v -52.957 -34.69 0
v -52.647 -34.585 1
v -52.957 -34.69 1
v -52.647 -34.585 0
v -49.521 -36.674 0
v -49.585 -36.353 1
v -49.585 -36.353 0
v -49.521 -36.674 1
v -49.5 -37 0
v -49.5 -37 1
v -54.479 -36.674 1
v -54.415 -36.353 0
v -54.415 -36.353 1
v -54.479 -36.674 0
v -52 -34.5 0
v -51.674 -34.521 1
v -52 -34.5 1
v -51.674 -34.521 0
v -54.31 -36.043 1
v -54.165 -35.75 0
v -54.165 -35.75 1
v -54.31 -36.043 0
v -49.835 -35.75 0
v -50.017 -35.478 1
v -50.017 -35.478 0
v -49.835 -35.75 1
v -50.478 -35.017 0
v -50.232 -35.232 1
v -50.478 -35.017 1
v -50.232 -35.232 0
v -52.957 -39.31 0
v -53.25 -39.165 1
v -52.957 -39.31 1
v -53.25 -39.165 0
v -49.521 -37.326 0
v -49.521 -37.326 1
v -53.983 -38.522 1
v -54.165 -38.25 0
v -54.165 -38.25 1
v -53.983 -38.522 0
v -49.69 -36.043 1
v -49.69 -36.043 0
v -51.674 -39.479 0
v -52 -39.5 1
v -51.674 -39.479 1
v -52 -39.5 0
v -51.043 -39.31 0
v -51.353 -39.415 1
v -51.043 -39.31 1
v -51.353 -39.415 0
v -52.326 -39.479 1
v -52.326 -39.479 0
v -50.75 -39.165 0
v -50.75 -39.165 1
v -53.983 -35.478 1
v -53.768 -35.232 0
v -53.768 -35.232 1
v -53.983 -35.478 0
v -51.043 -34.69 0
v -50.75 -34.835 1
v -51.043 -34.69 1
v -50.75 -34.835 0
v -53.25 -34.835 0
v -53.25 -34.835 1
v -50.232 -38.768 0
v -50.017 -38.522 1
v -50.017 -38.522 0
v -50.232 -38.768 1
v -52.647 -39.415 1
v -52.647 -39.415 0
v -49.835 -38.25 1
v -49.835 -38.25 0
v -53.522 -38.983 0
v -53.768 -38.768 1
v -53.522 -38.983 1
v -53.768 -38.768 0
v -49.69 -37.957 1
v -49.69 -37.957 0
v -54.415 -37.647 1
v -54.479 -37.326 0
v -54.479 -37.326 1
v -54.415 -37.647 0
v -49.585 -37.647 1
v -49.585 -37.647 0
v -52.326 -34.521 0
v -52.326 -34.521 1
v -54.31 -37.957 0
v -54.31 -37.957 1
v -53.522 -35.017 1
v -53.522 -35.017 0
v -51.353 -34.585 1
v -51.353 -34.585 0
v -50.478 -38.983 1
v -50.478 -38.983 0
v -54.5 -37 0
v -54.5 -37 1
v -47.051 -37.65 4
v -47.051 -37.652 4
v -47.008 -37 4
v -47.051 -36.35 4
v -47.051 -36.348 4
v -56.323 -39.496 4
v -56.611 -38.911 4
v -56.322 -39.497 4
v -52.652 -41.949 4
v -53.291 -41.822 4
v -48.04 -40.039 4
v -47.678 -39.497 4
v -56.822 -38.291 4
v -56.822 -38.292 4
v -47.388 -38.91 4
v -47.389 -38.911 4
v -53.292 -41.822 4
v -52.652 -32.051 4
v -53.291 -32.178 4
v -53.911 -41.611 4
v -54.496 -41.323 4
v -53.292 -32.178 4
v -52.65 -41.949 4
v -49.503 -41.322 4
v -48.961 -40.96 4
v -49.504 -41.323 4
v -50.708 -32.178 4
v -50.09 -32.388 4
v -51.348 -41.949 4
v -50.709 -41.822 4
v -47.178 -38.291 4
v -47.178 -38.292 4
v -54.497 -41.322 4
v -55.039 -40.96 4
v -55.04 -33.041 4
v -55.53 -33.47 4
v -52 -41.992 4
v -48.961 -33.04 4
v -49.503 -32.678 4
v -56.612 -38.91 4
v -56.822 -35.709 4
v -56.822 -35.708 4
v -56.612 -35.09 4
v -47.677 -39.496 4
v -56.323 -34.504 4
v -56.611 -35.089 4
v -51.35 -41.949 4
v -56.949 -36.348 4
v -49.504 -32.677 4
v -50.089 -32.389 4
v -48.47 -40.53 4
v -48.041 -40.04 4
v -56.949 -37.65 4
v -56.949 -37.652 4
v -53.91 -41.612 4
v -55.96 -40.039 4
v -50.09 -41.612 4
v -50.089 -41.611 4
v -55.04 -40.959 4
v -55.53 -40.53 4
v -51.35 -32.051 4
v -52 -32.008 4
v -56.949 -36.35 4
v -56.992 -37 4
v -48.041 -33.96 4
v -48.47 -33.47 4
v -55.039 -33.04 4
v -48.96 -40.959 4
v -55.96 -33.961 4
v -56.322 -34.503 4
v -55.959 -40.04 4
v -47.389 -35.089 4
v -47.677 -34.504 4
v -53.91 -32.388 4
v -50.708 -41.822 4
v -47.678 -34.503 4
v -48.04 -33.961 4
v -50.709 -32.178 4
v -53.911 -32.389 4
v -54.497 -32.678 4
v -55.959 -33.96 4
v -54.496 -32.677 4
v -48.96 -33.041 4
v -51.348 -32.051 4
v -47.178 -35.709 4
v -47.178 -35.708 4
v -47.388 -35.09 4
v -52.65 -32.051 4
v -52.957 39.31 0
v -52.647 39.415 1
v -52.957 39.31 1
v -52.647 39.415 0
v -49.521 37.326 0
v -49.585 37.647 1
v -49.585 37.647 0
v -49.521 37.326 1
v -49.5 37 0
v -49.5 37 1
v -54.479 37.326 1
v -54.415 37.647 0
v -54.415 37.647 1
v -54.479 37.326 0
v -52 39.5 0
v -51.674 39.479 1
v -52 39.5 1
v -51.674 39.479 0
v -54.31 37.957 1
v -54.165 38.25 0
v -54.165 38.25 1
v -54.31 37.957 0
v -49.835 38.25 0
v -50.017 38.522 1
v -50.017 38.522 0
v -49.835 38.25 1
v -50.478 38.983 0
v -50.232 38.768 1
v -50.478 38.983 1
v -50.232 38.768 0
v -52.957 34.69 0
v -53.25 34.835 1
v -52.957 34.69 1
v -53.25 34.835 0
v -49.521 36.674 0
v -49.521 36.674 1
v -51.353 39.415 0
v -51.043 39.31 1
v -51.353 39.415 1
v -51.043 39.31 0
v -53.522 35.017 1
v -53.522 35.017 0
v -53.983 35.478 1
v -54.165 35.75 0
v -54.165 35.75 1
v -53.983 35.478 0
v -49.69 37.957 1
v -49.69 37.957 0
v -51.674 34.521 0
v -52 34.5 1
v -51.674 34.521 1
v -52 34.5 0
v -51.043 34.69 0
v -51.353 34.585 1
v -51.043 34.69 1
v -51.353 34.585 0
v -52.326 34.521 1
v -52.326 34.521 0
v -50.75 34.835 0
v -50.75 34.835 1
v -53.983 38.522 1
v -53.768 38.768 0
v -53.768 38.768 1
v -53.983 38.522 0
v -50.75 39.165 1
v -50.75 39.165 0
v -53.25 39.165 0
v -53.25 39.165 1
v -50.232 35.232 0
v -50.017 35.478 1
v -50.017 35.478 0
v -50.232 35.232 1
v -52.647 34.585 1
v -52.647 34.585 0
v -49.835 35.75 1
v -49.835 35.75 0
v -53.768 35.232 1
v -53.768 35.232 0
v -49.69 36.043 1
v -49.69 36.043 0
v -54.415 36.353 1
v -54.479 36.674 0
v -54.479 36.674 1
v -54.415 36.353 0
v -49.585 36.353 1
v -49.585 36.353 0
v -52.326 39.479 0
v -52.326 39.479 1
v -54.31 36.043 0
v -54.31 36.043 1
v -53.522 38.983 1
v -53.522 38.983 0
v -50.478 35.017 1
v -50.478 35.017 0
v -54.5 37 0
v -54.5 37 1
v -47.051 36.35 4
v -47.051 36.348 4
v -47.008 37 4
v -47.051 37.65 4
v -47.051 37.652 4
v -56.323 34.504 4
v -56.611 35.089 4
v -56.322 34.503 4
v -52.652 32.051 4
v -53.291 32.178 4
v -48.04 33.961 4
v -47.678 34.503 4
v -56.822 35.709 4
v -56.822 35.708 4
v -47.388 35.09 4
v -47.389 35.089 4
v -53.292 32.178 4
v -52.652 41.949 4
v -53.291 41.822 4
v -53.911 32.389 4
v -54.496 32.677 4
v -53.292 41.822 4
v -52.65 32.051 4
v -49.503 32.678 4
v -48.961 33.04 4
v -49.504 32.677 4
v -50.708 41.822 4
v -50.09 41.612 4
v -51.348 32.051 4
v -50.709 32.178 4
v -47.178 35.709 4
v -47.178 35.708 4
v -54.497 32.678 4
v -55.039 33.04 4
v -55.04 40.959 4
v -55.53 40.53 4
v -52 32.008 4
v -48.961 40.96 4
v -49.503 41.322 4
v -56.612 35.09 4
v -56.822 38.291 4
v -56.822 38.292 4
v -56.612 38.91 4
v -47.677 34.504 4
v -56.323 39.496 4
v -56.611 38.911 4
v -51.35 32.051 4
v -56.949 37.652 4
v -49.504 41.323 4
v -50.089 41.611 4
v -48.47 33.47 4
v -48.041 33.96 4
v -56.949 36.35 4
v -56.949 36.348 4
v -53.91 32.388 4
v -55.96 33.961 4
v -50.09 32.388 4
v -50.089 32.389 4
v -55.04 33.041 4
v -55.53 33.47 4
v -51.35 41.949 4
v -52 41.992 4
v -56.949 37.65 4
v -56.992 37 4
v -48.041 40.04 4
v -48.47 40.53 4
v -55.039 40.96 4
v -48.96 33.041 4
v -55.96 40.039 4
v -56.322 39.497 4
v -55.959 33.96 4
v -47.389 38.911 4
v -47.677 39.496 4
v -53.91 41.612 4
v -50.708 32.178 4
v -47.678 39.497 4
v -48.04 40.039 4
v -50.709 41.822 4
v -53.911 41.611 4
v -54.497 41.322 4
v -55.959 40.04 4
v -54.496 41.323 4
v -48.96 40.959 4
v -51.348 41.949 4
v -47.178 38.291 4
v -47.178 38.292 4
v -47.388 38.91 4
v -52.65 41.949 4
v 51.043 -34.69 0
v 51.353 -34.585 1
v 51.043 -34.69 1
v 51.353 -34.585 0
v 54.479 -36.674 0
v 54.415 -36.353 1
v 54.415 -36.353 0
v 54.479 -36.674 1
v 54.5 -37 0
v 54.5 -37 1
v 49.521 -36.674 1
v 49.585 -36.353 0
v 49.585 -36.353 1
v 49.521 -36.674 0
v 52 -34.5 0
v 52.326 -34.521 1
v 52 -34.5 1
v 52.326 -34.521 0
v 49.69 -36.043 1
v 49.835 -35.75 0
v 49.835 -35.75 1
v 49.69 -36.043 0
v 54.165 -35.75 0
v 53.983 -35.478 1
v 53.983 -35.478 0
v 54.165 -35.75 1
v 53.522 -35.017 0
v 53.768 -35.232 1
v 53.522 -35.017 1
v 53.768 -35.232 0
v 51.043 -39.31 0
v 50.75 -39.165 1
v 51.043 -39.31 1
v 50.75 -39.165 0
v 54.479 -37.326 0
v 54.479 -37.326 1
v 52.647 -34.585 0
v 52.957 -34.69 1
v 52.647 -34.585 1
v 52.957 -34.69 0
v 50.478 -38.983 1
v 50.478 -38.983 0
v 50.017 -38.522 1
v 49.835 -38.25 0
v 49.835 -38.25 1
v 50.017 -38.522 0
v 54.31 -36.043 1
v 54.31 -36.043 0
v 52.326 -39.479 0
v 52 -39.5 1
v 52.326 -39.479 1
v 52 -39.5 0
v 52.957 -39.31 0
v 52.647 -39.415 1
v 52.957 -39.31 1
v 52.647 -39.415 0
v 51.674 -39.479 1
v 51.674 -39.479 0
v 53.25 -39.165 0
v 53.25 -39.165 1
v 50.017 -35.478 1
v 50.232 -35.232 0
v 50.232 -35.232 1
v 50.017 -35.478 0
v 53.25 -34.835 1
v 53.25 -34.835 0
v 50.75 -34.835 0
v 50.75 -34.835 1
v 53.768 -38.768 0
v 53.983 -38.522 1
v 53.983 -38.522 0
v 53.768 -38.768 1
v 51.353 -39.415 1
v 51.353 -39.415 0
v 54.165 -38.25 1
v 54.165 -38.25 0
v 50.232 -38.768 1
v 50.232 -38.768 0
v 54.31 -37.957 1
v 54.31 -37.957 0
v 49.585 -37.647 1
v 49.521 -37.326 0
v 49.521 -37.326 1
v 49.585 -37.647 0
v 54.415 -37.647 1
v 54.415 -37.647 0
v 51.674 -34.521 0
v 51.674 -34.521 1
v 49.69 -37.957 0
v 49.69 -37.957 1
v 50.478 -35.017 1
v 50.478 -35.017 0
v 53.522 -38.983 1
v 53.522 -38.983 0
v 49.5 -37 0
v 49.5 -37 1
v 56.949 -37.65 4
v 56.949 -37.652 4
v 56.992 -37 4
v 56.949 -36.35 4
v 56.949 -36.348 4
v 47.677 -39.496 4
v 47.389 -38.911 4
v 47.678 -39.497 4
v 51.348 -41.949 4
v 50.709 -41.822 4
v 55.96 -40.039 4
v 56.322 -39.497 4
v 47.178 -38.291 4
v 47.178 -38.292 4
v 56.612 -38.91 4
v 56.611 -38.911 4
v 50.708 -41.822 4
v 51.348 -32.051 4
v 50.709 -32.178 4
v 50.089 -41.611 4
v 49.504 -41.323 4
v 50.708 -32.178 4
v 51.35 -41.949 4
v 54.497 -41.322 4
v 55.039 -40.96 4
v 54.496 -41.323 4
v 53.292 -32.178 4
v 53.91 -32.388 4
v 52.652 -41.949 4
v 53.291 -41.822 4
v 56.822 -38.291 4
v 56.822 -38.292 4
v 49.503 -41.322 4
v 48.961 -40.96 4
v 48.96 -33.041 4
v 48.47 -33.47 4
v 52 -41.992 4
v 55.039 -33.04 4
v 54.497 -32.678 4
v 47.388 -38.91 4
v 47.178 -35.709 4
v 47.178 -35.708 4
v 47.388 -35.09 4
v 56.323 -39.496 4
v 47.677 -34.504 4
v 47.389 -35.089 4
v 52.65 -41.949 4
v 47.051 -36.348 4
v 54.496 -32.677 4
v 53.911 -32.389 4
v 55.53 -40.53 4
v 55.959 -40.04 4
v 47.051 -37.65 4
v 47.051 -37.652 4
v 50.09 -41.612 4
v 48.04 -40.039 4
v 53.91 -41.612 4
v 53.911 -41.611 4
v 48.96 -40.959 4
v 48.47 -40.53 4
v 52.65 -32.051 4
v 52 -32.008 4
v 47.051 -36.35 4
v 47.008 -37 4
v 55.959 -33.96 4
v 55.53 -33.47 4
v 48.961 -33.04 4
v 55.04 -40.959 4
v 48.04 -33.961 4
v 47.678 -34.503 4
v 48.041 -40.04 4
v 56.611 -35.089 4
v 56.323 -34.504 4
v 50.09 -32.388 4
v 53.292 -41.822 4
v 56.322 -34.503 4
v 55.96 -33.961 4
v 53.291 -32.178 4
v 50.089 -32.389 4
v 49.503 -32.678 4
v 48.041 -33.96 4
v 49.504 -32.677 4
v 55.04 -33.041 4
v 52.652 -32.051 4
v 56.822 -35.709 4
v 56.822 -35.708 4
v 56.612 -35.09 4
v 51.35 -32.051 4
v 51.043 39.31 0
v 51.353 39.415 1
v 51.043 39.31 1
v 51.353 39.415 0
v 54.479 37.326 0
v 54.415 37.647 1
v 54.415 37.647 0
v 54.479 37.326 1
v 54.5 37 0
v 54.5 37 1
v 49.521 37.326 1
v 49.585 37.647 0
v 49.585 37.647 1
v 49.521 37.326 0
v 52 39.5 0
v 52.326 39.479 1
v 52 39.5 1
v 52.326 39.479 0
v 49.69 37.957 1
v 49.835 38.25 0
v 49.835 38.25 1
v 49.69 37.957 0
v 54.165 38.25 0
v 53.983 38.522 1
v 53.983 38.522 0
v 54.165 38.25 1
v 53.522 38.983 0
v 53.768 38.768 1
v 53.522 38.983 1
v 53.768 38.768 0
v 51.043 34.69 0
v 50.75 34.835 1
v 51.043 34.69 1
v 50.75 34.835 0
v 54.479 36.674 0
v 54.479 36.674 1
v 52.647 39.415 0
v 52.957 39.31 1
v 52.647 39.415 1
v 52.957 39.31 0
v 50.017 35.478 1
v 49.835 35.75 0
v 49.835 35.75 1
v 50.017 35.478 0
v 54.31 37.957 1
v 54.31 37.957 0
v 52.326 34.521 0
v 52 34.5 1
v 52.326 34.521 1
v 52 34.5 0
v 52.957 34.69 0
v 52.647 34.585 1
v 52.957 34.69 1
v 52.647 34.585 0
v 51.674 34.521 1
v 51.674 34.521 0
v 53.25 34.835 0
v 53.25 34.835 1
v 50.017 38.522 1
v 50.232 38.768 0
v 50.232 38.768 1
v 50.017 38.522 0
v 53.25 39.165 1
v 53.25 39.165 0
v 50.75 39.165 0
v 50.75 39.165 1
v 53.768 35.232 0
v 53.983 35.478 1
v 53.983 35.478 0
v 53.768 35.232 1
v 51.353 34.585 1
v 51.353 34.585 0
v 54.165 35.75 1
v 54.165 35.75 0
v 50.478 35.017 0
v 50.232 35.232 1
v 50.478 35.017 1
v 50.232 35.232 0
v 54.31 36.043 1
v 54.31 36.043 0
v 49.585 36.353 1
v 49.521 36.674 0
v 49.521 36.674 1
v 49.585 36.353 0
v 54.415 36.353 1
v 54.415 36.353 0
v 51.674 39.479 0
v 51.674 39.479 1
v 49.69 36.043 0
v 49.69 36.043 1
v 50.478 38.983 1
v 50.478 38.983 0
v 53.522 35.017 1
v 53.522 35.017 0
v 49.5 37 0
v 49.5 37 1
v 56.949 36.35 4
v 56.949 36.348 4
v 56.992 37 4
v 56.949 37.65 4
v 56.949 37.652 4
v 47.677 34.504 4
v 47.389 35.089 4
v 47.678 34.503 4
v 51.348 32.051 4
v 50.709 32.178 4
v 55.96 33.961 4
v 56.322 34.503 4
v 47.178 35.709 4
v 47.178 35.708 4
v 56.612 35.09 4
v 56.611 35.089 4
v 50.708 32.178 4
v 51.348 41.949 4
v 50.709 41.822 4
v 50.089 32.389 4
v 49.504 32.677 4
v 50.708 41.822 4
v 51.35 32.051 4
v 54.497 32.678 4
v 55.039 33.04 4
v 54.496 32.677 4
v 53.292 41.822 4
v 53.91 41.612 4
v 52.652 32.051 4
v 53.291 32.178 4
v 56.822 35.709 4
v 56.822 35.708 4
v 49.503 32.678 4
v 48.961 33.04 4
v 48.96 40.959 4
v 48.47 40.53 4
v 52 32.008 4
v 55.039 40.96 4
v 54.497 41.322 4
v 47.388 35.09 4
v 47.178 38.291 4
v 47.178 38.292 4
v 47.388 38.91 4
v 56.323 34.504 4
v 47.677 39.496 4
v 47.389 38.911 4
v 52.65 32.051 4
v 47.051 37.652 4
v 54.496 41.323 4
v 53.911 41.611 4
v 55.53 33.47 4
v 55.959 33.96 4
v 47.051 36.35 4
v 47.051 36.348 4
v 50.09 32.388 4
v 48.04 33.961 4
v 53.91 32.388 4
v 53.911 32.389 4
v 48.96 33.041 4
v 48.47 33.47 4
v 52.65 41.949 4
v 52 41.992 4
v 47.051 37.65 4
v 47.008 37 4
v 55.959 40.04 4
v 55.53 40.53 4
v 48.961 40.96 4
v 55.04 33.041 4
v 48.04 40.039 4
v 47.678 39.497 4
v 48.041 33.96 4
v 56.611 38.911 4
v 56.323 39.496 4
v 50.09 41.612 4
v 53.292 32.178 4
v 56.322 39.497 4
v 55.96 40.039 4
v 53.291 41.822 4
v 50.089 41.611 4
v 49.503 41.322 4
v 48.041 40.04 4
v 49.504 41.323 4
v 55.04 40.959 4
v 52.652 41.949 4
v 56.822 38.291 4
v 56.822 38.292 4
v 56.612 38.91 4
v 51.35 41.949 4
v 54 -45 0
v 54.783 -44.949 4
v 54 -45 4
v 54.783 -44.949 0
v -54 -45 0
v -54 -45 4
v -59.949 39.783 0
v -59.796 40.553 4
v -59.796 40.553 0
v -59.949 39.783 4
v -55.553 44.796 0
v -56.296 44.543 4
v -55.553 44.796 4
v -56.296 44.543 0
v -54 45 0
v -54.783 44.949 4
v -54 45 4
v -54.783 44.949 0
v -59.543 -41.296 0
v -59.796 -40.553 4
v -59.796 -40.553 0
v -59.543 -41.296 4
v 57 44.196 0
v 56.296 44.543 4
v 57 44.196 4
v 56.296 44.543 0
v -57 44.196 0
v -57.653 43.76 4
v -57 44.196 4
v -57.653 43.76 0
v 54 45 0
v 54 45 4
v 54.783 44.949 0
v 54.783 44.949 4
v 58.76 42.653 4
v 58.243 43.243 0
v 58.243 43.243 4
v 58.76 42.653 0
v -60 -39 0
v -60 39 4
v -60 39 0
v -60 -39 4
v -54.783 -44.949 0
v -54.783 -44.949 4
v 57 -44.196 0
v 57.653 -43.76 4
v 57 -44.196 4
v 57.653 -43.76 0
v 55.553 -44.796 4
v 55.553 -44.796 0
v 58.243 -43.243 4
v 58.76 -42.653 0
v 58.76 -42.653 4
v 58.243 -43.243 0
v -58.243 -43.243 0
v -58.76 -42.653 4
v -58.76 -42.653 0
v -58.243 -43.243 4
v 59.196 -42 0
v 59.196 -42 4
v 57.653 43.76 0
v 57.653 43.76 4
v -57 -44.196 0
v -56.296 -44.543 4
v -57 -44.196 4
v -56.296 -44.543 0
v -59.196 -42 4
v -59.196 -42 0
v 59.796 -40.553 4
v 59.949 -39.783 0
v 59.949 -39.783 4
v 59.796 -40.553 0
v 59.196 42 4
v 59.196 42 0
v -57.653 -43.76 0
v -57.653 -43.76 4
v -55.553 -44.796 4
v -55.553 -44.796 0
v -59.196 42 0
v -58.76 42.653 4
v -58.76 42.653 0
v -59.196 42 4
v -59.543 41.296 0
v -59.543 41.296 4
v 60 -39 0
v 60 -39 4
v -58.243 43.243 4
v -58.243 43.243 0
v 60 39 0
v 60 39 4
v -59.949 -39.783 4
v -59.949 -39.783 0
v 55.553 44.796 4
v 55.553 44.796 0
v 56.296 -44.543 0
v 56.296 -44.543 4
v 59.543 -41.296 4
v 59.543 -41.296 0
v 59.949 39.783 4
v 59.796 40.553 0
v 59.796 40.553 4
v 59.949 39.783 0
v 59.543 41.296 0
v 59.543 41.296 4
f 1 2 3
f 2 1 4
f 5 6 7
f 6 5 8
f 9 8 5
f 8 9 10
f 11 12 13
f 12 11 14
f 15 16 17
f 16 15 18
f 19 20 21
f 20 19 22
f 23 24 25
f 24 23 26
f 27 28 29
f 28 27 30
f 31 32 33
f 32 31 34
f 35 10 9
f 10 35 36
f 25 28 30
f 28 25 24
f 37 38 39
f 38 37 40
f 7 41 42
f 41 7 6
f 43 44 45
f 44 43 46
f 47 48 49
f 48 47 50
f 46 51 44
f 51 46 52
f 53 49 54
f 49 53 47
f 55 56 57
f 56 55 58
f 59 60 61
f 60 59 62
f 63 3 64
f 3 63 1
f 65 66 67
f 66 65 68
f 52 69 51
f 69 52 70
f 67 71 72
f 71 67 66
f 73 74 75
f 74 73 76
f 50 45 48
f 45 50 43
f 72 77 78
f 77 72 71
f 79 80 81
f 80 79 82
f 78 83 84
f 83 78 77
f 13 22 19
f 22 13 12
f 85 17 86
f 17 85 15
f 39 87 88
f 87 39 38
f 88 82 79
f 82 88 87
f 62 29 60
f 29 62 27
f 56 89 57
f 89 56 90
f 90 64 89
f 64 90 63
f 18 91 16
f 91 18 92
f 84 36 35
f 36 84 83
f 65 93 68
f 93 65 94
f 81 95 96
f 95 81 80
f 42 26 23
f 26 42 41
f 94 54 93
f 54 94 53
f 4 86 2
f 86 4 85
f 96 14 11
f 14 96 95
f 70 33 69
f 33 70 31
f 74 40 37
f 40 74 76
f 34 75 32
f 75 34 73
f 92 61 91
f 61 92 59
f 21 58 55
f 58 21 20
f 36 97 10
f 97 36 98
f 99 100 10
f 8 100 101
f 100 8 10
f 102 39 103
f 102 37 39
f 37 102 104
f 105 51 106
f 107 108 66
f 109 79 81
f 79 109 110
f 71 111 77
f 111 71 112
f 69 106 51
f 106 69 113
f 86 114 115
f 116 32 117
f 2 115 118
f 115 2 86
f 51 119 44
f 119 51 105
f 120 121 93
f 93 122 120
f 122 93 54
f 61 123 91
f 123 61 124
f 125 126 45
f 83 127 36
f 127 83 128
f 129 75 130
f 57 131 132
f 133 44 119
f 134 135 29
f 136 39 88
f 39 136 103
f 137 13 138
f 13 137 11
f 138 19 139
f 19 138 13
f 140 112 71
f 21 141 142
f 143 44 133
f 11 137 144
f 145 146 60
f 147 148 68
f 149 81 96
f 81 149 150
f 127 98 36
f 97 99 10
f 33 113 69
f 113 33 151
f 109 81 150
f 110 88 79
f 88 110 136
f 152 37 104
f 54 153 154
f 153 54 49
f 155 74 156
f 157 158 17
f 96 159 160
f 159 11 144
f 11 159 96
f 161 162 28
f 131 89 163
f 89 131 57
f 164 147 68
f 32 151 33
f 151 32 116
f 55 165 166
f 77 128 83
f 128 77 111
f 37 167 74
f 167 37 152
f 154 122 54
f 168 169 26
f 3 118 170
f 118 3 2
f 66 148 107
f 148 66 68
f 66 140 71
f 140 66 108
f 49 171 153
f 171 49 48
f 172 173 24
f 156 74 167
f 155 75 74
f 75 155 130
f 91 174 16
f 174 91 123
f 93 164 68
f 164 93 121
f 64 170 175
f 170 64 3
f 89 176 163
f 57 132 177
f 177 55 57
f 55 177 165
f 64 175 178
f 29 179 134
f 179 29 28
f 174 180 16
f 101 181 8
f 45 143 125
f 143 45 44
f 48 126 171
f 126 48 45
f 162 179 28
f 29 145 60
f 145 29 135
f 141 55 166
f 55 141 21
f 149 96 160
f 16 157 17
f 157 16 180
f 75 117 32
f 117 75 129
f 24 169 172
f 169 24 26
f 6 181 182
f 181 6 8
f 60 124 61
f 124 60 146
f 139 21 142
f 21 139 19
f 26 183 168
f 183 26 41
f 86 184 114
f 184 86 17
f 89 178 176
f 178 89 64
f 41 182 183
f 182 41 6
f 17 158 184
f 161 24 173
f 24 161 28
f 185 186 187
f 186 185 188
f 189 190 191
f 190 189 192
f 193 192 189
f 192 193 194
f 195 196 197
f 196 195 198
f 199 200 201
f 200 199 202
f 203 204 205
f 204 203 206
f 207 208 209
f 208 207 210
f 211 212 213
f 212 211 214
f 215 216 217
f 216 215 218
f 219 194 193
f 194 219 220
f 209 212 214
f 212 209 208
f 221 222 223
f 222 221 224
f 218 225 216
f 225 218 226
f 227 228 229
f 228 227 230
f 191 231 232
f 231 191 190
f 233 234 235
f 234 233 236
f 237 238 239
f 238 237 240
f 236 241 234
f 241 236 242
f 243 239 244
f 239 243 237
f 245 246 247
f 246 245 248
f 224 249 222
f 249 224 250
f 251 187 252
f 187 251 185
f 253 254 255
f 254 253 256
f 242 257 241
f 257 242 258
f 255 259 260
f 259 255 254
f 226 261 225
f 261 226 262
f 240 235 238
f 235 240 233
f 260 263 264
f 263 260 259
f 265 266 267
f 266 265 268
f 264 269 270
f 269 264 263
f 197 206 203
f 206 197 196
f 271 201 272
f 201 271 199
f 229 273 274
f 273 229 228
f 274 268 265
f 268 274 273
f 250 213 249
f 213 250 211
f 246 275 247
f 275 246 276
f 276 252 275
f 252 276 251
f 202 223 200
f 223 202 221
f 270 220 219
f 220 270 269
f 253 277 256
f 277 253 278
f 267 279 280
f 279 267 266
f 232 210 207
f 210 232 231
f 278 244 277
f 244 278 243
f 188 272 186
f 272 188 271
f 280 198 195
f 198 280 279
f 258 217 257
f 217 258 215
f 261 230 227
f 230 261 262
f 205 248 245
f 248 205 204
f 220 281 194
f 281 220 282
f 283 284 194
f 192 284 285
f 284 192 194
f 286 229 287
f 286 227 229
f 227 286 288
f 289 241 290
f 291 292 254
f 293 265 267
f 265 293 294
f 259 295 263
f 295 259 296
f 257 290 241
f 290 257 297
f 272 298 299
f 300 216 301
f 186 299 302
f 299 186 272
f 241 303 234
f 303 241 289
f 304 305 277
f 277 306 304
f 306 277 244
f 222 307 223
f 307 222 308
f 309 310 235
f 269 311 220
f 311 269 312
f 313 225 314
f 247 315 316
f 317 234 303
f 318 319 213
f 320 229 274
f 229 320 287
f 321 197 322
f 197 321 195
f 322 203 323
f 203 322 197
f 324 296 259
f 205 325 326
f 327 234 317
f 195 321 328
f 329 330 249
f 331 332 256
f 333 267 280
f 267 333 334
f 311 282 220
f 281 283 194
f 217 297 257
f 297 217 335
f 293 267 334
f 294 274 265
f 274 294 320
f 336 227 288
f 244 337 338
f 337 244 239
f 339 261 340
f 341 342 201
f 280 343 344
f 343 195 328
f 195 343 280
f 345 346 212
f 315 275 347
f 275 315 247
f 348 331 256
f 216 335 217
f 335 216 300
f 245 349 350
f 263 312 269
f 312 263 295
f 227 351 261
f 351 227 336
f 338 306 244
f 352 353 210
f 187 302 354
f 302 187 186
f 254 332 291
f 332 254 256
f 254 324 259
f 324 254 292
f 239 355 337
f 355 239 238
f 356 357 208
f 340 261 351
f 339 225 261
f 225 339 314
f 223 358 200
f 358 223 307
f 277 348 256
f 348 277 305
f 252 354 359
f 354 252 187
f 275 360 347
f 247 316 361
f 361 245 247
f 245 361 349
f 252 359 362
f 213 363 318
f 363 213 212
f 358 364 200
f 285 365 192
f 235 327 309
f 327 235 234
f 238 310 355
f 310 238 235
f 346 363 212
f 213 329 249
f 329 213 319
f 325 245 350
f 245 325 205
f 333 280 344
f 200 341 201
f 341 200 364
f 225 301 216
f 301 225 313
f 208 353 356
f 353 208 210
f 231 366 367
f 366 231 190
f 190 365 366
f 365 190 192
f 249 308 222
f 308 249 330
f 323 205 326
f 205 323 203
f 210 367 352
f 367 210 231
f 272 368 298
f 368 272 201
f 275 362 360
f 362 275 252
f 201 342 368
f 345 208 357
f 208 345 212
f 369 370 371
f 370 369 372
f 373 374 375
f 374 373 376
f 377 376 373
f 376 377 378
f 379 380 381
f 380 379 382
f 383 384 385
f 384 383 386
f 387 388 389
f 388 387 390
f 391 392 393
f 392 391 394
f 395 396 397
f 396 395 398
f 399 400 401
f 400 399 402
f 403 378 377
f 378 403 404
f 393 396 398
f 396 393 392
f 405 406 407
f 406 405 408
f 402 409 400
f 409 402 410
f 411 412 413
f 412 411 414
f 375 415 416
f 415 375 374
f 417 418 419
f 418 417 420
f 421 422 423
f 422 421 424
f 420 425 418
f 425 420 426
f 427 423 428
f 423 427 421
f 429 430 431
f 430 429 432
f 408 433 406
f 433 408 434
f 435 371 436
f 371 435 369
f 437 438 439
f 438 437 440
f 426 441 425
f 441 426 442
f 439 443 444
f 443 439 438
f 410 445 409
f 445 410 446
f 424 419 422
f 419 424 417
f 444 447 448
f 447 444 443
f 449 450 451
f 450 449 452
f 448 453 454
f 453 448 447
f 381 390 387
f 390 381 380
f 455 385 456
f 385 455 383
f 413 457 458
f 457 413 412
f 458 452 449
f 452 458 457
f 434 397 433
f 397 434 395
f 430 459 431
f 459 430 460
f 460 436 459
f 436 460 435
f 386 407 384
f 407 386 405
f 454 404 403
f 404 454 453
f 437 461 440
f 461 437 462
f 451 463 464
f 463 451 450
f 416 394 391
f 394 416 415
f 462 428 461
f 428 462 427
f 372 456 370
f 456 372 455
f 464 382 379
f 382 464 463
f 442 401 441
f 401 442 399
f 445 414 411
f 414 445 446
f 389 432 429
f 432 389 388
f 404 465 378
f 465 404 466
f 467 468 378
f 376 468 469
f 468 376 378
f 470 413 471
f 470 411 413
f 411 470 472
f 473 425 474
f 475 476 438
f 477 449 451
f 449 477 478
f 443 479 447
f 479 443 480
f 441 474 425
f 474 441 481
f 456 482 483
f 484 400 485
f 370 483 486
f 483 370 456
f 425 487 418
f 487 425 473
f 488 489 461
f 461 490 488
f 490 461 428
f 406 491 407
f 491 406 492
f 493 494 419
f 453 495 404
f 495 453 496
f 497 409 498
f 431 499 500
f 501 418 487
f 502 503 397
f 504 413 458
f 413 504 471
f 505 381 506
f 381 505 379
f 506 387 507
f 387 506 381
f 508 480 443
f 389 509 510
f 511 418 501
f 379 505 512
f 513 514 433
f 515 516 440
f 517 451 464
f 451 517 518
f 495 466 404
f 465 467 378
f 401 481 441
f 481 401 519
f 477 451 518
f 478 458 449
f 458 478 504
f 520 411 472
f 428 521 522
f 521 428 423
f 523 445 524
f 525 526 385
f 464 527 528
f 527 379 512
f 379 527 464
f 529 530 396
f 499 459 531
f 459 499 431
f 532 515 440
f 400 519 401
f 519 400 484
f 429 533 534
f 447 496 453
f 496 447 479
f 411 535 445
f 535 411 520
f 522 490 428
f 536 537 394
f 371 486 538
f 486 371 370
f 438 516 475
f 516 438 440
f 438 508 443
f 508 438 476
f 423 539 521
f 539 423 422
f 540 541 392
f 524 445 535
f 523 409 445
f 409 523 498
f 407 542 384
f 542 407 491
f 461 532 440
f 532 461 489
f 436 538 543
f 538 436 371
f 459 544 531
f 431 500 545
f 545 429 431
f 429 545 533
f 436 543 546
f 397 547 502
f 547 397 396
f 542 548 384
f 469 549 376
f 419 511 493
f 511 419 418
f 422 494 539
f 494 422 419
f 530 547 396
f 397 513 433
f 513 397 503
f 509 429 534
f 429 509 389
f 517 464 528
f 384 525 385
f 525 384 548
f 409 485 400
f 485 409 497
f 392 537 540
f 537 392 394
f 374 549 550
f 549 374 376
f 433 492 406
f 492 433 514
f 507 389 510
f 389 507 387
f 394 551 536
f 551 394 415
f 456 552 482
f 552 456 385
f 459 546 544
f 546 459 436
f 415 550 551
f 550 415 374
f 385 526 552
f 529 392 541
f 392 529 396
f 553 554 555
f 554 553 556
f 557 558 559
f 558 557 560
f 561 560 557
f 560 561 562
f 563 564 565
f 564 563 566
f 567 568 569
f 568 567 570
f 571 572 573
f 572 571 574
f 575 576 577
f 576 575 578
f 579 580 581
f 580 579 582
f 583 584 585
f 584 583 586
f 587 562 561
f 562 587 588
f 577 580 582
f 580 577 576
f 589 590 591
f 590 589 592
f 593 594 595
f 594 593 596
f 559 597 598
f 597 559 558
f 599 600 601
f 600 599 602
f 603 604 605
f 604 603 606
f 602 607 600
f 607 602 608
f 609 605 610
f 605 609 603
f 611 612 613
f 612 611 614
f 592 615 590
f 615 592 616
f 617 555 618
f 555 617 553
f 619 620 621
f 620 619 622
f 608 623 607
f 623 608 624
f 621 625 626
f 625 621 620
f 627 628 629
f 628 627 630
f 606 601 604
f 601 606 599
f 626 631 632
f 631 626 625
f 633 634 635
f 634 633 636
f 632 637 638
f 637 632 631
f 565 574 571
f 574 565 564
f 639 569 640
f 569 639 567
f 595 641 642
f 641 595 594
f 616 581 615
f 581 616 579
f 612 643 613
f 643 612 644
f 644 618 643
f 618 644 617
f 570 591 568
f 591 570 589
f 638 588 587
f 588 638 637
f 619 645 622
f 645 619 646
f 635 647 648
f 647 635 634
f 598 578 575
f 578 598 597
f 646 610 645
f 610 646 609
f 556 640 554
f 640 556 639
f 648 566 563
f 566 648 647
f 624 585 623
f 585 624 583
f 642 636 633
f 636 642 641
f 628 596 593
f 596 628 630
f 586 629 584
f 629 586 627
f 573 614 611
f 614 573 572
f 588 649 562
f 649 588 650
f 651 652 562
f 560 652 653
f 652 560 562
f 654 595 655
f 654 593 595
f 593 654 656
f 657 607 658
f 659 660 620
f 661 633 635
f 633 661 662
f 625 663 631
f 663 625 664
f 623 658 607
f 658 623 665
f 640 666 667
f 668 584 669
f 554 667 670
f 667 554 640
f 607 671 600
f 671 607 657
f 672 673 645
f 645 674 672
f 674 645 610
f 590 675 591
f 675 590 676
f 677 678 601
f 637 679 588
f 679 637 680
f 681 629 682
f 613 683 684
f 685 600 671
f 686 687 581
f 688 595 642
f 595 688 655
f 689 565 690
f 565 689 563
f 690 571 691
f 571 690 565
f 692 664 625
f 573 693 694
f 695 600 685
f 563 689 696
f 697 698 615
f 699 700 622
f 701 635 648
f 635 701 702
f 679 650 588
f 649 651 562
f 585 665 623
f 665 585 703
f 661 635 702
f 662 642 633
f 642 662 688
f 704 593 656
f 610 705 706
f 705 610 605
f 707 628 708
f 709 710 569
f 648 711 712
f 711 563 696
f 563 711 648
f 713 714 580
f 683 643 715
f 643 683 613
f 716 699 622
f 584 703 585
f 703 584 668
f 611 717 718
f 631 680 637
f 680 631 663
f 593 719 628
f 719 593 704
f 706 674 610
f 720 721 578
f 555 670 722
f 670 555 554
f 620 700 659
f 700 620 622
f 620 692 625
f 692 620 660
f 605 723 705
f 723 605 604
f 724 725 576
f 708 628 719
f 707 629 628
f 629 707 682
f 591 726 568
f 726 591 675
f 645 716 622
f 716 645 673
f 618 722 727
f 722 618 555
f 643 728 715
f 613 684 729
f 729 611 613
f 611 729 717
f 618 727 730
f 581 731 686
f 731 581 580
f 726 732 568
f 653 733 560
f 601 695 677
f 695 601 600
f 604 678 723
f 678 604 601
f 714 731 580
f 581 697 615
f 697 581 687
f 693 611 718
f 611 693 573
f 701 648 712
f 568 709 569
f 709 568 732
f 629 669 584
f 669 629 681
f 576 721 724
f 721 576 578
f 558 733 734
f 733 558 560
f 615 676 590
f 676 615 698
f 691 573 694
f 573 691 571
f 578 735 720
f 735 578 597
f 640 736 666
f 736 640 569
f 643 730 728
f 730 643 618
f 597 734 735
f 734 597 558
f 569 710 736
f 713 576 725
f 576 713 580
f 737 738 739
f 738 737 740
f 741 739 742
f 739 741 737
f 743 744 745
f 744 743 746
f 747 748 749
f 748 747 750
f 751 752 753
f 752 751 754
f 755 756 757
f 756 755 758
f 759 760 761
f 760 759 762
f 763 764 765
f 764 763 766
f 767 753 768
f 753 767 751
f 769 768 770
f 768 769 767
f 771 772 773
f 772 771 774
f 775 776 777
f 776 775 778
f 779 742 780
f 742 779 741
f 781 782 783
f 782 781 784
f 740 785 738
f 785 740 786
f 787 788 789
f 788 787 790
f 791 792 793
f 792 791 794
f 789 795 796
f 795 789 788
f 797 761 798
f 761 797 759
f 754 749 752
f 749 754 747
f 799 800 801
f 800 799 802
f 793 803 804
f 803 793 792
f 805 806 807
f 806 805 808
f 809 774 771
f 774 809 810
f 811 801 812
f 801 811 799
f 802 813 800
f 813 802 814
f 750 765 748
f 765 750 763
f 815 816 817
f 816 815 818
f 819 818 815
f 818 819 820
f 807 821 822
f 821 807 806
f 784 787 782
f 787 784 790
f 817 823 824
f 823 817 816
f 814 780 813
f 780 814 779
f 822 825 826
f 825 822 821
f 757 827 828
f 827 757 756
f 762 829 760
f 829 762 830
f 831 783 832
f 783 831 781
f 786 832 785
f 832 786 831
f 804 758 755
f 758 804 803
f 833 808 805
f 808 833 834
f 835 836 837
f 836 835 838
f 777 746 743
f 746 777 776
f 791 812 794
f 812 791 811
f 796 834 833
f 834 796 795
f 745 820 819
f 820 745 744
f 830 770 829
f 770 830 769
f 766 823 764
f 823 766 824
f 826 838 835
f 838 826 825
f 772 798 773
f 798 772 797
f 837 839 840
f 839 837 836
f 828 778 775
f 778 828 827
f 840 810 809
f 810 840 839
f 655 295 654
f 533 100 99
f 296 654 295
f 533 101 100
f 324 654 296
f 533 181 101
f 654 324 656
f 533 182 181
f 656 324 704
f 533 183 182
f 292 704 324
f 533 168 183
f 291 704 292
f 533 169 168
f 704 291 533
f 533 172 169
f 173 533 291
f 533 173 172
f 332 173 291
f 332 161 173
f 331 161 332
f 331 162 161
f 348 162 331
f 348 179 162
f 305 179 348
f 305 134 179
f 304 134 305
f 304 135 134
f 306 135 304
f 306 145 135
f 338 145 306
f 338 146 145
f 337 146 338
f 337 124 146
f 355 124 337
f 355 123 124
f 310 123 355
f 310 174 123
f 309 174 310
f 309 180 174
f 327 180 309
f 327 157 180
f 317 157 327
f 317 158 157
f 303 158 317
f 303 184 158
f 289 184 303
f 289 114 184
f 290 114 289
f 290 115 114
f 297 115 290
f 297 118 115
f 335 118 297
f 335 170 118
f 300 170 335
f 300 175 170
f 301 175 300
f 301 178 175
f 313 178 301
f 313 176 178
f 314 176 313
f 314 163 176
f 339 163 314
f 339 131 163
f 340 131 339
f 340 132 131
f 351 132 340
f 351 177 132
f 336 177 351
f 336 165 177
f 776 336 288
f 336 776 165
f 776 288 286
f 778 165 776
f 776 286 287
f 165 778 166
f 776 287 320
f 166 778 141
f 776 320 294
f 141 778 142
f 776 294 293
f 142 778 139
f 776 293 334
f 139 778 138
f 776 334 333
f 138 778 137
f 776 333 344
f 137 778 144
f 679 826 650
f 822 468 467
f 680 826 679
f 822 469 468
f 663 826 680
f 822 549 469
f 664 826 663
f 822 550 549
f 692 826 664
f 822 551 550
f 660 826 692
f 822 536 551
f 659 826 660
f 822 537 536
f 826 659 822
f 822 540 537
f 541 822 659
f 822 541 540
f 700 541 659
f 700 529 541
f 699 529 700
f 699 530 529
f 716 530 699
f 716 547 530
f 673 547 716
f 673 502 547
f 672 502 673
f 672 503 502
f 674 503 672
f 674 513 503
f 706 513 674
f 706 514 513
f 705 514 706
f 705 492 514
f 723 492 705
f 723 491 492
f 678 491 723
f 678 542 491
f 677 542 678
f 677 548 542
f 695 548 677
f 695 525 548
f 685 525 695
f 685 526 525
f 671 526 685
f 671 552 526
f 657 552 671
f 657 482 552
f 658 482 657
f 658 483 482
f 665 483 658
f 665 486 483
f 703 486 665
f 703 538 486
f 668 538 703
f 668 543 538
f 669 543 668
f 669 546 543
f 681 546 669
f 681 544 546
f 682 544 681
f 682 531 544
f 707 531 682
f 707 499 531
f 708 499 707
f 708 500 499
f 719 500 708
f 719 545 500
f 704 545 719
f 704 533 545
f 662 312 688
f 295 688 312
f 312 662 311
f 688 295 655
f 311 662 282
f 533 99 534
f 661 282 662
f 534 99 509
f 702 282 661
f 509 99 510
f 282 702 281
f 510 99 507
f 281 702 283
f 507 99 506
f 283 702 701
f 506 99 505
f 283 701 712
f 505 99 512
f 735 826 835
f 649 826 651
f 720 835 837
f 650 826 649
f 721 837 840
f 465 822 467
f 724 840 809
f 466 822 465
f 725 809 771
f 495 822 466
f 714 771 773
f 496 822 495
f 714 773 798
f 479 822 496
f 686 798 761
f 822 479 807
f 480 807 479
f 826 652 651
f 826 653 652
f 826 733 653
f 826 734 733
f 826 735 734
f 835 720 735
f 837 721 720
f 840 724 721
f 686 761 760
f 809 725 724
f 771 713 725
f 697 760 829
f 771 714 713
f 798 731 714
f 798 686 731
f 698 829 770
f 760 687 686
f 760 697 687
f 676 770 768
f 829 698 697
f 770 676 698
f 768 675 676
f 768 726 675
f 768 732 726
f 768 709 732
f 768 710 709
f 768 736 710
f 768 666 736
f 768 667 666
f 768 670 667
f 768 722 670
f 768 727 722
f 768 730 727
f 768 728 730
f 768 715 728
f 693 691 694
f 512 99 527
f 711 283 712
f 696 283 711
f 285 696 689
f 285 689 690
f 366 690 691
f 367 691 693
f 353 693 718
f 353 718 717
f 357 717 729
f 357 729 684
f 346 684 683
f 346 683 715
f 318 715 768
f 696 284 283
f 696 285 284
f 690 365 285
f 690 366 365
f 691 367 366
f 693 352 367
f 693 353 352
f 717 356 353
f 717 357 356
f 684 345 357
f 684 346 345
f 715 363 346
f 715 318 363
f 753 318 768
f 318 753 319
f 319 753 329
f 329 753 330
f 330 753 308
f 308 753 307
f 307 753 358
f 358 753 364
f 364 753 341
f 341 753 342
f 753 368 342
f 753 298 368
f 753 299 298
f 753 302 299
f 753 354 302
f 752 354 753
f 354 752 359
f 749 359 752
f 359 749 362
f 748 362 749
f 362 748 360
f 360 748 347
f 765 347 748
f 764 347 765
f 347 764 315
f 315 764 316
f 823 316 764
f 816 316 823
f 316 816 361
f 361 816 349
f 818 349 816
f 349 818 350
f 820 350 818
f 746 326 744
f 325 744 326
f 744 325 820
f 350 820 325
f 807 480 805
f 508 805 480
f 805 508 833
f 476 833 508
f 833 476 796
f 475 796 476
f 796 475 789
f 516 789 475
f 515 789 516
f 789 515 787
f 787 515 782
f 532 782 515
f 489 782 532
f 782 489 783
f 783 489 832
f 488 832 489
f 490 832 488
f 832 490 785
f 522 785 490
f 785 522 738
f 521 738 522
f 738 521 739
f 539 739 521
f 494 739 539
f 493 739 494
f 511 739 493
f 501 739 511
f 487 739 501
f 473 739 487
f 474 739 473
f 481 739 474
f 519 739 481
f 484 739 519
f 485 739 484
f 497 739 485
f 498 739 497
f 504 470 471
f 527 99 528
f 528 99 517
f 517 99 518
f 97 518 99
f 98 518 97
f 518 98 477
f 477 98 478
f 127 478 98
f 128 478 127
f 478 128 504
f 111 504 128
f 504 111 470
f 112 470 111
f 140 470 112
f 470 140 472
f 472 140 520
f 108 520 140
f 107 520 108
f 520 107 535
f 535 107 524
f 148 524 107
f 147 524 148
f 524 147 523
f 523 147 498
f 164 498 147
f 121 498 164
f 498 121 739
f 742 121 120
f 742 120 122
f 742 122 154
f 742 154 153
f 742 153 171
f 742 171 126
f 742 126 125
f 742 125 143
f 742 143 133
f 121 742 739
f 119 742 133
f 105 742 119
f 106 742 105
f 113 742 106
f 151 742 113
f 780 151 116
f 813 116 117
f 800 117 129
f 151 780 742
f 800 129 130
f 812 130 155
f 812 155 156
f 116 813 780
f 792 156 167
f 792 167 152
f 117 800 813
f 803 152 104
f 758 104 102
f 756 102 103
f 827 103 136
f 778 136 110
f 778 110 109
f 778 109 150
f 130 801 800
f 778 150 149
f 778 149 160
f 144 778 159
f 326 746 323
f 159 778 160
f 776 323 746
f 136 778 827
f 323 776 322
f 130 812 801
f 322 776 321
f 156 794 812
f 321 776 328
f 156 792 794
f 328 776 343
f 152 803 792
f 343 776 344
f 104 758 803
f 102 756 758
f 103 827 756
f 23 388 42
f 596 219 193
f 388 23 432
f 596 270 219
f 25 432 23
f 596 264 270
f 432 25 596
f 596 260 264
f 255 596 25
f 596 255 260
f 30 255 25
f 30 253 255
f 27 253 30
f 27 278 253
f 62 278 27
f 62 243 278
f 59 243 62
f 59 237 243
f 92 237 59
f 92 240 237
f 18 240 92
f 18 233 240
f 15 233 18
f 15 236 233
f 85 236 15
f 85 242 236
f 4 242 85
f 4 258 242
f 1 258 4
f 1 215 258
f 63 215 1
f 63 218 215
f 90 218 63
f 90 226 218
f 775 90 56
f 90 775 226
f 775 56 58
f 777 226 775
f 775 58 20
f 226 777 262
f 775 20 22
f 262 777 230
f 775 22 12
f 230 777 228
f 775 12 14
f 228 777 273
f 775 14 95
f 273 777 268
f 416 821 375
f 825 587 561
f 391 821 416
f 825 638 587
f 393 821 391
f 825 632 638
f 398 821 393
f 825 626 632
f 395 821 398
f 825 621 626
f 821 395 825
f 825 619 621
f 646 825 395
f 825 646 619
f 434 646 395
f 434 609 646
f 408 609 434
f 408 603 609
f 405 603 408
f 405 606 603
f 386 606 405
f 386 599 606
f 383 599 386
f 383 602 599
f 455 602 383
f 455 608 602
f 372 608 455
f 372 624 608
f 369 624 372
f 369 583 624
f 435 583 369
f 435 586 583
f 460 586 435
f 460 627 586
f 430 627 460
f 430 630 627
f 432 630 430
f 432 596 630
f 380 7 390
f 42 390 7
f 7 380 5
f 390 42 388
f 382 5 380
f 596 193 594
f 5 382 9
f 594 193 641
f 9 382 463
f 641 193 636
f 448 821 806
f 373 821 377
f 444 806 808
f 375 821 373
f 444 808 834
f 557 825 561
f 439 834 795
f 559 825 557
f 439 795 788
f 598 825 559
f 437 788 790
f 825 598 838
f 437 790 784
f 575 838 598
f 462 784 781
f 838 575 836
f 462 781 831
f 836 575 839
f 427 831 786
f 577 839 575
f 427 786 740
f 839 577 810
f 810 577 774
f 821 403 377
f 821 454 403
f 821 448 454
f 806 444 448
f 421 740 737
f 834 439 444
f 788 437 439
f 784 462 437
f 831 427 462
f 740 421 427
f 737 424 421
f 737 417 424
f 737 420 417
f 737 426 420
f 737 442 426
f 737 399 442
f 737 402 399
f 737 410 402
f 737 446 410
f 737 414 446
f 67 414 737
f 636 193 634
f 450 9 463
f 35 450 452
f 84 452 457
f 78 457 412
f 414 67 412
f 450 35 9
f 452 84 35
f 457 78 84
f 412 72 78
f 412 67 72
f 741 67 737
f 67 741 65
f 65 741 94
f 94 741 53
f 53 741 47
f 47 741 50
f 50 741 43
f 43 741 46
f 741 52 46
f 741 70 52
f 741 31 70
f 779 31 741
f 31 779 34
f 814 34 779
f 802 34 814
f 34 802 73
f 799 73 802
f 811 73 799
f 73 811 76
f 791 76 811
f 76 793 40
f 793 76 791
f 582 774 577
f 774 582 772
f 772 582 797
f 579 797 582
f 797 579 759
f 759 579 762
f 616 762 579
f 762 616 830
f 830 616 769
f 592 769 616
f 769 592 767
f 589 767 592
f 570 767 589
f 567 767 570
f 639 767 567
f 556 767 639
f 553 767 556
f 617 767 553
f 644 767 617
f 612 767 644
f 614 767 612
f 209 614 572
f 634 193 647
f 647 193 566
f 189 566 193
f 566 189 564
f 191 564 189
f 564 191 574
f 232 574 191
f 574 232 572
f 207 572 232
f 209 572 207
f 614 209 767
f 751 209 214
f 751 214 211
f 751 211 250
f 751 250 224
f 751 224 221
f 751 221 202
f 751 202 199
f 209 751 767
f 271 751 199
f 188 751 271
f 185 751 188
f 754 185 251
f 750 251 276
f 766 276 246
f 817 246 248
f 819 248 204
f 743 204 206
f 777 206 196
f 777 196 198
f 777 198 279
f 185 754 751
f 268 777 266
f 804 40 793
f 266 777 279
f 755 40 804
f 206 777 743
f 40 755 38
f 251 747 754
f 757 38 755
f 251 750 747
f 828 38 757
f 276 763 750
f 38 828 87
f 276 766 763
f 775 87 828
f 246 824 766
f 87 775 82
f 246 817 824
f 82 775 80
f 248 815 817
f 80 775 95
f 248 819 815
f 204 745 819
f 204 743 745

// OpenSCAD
// Rounded mounting plate - a flat plate with rounded corners and a countersunk screw hole near each
// corner. Teaches 2D corner rounding with offset() and a countersink (chamfered hole). NOVEL part.
//
// @desc flat plate, rounded corners, countersunk holes
// @prompt Design a mounting plate in OpenSCAD: {L} by {W} mm and {t} mm thick, with {r} mm rounded corners and a countersunk hole for an {screw} mm screw near each corner. Reply with a single complete OpenSCAD file.
// @param L     length, mm           [40:120]
// @param W     width, mm            [30:90]
// @param t     thickness, mm        [3:8]
// @param r     corner radius, mm    [3:12]
// @param screw screw diameter, mm   [3:6]

L     = 120;
W     = 90;
t     = 4;
r     = 6;
screw = 5;

$fn = 48;

inset = r + 2;                     // hole-centre inset from the edges
head  = screw * 2;                 // countersink top diameter
csk   = min(screw, t - 1);         // countersink depth

module rounded_rect(l, w, rad) {
    offset(r = rad) square([l - 2 * rad, w - 2 * rad], center = true);
}

difference() {
    linear_extrude(t) rounded_rect(L, W, r);
    for (sx = [-1, 1], sy = [-1, 1])
        translate([sx * (L / 2 - inset), sy * (W / 2 - inset), 0]) {
            translate([0, 0, -1]) cylinder(h = t + 2, d = screw);                       // shank
            translate([0, 0, t - csk]) cylinder(h = csk + 0.01, d1 = screw, d2 = head); // countersink
        }
}
